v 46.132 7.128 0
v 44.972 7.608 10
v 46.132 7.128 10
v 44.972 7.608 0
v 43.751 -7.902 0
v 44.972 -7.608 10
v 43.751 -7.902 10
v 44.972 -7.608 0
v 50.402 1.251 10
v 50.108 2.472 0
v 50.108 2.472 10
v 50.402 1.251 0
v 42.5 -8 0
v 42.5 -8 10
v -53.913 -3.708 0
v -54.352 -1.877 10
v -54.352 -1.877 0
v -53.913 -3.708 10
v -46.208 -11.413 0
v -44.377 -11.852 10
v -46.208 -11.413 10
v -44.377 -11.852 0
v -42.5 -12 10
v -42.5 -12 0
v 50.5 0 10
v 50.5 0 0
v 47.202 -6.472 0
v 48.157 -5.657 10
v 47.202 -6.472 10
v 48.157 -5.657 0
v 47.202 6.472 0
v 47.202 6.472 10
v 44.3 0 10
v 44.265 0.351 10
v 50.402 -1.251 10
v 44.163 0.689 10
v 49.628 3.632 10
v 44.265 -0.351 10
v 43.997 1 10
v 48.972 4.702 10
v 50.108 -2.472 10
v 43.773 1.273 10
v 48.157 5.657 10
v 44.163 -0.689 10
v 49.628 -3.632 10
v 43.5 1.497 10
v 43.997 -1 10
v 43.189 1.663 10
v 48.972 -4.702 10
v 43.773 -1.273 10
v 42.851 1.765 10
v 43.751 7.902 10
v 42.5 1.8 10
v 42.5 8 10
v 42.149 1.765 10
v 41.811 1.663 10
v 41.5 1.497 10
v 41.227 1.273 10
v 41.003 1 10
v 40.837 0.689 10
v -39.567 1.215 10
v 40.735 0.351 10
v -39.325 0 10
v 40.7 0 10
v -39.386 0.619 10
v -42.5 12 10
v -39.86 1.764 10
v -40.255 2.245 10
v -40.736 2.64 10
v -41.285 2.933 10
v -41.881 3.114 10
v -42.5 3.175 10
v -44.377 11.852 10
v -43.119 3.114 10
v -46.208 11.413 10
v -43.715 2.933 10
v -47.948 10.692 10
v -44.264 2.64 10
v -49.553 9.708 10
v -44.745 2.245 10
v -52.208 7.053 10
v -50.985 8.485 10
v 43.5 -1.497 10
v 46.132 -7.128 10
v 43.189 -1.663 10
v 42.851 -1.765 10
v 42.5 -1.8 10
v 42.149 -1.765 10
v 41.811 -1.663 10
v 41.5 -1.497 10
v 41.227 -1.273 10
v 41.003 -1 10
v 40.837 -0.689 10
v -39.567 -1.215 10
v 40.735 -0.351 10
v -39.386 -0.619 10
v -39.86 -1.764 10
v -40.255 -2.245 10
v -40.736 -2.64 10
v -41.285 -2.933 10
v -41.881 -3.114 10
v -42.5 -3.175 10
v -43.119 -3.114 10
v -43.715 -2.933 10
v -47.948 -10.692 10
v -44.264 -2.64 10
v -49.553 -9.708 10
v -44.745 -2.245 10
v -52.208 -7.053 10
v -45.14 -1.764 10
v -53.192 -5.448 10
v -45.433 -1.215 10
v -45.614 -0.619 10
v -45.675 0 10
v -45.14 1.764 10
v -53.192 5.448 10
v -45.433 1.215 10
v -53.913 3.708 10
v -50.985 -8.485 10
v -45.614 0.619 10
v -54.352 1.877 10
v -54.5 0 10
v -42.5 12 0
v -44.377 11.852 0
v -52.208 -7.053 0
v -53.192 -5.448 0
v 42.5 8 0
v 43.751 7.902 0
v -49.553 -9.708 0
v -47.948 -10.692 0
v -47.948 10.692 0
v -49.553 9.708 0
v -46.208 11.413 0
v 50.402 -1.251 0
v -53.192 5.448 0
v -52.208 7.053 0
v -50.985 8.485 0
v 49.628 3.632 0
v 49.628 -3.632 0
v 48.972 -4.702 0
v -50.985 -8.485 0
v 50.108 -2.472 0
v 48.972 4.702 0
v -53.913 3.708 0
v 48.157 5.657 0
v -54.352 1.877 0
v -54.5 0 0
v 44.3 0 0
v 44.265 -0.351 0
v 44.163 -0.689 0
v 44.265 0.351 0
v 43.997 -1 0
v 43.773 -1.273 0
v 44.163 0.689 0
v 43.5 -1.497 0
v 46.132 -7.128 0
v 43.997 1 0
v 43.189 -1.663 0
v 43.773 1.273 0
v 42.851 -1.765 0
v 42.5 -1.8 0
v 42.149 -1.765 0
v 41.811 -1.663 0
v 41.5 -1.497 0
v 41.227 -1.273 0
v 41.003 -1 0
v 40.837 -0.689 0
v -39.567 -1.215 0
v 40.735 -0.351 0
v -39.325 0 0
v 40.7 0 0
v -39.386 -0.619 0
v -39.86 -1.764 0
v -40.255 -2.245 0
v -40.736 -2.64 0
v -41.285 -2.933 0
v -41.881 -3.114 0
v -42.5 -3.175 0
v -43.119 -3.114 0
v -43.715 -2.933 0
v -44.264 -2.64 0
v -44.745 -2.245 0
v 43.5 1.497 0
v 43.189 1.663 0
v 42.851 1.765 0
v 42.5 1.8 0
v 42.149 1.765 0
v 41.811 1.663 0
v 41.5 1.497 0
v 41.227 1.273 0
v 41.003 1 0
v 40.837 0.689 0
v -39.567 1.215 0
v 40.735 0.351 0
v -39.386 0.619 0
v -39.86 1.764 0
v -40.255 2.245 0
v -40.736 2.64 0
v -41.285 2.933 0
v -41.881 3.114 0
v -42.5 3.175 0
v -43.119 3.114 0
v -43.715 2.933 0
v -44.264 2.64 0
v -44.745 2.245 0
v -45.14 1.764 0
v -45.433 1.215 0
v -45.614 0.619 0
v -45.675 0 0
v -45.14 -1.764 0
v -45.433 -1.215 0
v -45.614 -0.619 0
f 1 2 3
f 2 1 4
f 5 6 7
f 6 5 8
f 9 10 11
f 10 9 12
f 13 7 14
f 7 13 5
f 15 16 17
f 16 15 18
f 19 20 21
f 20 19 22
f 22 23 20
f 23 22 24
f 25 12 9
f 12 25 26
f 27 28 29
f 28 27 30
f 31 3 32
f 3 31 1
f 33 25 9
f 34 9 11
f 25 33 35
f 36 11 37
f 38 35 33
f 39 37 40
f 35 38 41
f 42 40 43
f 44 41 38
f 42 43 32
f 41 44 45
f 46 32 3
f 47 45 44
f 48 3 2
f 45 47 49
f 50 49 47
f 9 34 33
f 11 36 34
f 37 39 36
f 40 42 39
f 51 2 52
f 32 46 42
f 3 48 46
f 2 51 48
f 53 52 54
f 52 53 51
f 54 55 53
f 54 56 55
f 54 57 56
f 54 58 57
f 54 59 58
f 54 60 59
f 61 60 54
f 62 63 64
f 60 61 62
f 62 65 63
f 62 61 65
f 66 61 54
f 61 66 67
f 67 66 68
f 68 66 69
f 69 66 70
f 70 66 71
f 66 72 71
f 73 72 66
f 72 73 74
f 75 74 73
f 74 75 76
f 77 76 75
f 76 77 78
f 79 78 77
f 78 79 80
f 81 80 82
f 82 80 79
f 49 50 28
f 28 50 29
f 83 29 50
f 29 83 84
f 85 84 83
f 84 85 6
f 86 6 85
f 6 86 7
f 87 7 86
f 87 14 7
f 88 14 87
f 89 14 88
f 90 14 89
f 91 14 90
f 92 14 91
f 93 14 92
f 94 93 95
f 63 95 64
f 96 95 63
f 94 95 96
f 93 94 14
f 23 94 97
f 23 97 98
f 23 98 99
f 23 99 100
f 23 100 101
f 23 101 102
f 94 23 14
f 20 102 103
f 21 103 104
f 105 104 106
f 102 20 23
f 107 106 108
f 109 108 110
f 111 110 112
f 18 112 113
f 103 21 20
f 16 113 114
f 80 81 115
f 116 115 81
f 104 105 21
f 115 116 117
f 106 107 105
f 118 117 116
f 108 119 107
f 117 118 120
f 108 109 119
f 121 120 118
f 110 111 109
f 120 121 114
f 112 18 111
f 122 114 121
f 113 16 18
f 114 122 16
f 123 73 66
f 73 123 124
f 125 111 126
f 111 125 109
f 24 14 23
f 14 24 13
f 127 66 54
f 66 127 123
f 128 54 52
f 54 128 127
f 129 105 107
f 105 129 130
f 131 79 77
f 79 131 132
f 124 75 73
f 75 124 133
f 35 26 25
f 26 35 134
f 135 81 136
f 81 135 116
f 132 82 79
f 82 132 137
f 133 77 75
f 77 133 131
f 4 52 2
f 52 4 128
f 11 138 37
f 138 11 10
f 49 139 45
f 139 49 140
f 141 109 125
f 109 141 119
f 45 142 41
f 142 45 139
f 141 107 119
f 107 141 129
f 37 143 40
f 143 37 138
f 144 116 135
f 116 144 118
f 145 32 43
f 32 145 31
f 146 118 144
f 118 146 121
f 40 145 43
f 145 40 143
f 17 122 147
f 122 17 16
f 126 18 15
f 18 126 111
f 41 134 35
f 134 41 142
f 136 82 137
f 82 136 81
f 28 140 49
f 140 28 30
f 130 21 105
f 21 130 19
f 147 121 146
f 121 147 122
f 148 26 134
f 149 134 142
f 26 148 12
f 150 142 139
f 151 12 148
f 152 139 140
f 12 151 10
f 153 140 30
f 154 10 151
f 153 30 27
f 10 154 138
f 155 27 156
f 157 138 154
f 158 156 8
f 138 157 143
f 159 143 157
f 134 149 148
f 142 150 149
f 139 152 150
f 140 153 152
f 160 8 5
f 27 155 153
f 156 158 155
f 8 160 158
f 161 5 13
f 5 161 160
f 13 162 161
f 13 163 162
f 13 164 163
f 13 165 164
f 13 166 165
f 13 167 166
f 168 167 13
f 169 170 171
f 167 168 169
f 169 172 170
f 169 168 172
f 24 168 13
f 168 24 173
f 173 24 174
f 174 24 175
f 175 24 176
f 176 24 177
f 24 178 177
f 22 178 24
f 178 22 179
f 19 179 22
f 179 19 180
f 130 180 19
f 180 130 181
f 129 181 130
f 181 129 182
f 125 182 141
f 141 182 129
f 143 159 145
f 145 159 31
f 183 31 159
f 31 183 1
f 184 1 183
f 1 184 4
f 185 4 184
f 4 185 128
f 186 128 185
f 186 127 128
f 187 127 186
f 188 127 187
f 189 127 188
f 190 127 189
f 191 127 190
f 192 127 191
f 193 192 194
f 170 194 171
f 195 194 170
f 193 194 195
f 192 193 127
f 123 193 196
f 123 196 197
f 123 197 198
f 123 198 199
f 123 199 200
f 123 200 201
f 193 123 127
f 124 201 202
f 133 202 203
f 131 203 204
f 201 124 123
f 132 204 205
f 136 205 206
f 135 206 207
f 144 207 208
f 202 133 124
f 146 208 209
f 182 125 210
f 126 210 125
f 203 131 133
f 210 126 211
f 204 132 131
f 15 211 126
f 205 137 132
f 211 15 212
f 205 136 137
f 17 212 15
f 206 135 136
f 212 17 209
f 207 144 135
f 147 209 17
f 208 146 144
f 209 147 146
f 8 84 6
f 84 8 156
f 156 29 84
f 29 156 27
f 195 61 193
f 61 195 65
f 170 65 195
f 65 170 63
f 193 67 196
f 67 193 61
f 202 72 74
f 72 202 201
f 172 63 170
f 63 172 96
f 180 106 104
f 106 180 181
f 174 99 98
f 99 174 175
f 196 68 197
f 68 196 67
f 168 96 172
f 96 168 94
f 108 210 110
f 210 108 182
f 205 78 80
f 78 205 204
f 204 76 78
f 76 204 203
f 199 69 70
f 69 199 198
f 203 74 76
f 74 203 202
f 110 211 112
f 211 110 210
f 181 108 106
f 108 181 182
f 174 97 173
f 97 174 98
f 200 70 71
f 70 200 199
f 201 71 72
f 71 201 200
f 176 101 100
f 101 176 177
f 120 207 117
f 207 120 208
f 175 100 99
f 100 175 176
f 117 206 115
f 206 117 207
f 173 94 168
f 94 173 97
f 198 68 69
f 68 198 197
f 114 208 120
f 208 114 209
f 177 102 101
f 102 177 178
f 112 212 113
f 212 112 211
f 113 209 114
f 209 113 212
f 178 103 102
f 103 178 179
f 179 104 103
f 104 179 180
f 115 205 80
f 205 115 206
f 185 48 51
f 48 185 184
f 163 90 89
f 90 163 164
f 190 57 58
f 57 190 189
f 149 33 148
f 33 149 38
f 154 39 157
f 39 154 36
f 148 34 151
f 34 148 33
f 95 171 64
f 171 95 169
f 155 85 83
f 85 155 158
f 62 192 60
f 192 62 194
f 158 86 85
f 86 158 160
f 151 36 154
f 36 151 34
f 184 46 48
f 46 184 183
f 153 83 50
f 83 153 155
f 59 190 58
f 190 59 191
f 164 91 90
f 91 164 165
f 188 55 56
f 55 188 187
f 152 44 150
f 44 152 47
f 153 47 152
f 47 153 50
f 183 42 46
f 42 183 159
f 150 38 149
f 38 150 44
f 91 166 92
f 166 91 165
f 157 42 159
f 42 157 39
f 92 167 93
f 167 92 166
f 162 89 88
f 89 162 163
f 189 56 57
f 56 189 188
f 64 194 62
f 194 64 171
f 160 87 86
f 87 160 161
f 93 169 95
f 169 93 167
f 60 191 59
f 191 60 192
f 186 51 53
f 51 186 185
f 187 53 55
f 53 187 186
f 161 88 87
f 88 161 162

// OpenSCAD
$fn = 32;

// ----------------------------------------------------------------------
// Lever: 85 mm between the bosses, 10 mm thick, smooth outline
// ----------------------------------------------------------------------

// --- parameters (mm) ---
lever_l = 85;             // distance between the boss centres
boss_a = 24;              // first boss diameter
boss_b = 16;              // second boss diameter
bore_a = 6.35;            // first bore
bore_b = 3.6;             // second bore
lever_t = 10;             // lever thickness

lever_profile = [[-54.5, 0], [-54.352, -1.877], [-53.913, -3.708], [-53.192, -5.448], [-52.208, -7.053], [-50.985, -8.485], [-49.553, -9.708], [-47.948, -10.692], [-46.208, -11.413], [-44.377, -11.852], [-42.5, -12], [42.5, -8], [43.751, -7.902], [44.972, -7.608], [46.132, -7.128], [47.202, -6.472], [48.157, -5.657], [48.972, -4.702], [49.628, -3.632], [50.108, -2.472], [50.402, -1.251], [50.5, 0], [50.402, 1.251], [50.108, 2.472], [49.628, 3.632], [48.972, 4.702], [48.157, 5.657], [47.202, 6.472], [46.132, 7.128], [44.972, 7.608], [43.751, 7.902], [42.5, 8], [-42.5, 12], [-44.377, 11.852], [-46.208, 11.413], [-47.948, 10.692], [-49.553, 9.708], [-50.985, 8.485], [-52.208, 7.053], [-53.192, 5.448], [-53.913, 3.708], [-54.352, 1.877]];

difference() {
  linear_extrude(height = lever_t) polygon(lever_profile);
  translate([-42.5, 0, -2.5]) cylinder(h = lever_t + 5, d = bore_a);
  translate([42.5, 0, -2.5]) cylinder(h = lever_t + 5, d = bore_b);
}
